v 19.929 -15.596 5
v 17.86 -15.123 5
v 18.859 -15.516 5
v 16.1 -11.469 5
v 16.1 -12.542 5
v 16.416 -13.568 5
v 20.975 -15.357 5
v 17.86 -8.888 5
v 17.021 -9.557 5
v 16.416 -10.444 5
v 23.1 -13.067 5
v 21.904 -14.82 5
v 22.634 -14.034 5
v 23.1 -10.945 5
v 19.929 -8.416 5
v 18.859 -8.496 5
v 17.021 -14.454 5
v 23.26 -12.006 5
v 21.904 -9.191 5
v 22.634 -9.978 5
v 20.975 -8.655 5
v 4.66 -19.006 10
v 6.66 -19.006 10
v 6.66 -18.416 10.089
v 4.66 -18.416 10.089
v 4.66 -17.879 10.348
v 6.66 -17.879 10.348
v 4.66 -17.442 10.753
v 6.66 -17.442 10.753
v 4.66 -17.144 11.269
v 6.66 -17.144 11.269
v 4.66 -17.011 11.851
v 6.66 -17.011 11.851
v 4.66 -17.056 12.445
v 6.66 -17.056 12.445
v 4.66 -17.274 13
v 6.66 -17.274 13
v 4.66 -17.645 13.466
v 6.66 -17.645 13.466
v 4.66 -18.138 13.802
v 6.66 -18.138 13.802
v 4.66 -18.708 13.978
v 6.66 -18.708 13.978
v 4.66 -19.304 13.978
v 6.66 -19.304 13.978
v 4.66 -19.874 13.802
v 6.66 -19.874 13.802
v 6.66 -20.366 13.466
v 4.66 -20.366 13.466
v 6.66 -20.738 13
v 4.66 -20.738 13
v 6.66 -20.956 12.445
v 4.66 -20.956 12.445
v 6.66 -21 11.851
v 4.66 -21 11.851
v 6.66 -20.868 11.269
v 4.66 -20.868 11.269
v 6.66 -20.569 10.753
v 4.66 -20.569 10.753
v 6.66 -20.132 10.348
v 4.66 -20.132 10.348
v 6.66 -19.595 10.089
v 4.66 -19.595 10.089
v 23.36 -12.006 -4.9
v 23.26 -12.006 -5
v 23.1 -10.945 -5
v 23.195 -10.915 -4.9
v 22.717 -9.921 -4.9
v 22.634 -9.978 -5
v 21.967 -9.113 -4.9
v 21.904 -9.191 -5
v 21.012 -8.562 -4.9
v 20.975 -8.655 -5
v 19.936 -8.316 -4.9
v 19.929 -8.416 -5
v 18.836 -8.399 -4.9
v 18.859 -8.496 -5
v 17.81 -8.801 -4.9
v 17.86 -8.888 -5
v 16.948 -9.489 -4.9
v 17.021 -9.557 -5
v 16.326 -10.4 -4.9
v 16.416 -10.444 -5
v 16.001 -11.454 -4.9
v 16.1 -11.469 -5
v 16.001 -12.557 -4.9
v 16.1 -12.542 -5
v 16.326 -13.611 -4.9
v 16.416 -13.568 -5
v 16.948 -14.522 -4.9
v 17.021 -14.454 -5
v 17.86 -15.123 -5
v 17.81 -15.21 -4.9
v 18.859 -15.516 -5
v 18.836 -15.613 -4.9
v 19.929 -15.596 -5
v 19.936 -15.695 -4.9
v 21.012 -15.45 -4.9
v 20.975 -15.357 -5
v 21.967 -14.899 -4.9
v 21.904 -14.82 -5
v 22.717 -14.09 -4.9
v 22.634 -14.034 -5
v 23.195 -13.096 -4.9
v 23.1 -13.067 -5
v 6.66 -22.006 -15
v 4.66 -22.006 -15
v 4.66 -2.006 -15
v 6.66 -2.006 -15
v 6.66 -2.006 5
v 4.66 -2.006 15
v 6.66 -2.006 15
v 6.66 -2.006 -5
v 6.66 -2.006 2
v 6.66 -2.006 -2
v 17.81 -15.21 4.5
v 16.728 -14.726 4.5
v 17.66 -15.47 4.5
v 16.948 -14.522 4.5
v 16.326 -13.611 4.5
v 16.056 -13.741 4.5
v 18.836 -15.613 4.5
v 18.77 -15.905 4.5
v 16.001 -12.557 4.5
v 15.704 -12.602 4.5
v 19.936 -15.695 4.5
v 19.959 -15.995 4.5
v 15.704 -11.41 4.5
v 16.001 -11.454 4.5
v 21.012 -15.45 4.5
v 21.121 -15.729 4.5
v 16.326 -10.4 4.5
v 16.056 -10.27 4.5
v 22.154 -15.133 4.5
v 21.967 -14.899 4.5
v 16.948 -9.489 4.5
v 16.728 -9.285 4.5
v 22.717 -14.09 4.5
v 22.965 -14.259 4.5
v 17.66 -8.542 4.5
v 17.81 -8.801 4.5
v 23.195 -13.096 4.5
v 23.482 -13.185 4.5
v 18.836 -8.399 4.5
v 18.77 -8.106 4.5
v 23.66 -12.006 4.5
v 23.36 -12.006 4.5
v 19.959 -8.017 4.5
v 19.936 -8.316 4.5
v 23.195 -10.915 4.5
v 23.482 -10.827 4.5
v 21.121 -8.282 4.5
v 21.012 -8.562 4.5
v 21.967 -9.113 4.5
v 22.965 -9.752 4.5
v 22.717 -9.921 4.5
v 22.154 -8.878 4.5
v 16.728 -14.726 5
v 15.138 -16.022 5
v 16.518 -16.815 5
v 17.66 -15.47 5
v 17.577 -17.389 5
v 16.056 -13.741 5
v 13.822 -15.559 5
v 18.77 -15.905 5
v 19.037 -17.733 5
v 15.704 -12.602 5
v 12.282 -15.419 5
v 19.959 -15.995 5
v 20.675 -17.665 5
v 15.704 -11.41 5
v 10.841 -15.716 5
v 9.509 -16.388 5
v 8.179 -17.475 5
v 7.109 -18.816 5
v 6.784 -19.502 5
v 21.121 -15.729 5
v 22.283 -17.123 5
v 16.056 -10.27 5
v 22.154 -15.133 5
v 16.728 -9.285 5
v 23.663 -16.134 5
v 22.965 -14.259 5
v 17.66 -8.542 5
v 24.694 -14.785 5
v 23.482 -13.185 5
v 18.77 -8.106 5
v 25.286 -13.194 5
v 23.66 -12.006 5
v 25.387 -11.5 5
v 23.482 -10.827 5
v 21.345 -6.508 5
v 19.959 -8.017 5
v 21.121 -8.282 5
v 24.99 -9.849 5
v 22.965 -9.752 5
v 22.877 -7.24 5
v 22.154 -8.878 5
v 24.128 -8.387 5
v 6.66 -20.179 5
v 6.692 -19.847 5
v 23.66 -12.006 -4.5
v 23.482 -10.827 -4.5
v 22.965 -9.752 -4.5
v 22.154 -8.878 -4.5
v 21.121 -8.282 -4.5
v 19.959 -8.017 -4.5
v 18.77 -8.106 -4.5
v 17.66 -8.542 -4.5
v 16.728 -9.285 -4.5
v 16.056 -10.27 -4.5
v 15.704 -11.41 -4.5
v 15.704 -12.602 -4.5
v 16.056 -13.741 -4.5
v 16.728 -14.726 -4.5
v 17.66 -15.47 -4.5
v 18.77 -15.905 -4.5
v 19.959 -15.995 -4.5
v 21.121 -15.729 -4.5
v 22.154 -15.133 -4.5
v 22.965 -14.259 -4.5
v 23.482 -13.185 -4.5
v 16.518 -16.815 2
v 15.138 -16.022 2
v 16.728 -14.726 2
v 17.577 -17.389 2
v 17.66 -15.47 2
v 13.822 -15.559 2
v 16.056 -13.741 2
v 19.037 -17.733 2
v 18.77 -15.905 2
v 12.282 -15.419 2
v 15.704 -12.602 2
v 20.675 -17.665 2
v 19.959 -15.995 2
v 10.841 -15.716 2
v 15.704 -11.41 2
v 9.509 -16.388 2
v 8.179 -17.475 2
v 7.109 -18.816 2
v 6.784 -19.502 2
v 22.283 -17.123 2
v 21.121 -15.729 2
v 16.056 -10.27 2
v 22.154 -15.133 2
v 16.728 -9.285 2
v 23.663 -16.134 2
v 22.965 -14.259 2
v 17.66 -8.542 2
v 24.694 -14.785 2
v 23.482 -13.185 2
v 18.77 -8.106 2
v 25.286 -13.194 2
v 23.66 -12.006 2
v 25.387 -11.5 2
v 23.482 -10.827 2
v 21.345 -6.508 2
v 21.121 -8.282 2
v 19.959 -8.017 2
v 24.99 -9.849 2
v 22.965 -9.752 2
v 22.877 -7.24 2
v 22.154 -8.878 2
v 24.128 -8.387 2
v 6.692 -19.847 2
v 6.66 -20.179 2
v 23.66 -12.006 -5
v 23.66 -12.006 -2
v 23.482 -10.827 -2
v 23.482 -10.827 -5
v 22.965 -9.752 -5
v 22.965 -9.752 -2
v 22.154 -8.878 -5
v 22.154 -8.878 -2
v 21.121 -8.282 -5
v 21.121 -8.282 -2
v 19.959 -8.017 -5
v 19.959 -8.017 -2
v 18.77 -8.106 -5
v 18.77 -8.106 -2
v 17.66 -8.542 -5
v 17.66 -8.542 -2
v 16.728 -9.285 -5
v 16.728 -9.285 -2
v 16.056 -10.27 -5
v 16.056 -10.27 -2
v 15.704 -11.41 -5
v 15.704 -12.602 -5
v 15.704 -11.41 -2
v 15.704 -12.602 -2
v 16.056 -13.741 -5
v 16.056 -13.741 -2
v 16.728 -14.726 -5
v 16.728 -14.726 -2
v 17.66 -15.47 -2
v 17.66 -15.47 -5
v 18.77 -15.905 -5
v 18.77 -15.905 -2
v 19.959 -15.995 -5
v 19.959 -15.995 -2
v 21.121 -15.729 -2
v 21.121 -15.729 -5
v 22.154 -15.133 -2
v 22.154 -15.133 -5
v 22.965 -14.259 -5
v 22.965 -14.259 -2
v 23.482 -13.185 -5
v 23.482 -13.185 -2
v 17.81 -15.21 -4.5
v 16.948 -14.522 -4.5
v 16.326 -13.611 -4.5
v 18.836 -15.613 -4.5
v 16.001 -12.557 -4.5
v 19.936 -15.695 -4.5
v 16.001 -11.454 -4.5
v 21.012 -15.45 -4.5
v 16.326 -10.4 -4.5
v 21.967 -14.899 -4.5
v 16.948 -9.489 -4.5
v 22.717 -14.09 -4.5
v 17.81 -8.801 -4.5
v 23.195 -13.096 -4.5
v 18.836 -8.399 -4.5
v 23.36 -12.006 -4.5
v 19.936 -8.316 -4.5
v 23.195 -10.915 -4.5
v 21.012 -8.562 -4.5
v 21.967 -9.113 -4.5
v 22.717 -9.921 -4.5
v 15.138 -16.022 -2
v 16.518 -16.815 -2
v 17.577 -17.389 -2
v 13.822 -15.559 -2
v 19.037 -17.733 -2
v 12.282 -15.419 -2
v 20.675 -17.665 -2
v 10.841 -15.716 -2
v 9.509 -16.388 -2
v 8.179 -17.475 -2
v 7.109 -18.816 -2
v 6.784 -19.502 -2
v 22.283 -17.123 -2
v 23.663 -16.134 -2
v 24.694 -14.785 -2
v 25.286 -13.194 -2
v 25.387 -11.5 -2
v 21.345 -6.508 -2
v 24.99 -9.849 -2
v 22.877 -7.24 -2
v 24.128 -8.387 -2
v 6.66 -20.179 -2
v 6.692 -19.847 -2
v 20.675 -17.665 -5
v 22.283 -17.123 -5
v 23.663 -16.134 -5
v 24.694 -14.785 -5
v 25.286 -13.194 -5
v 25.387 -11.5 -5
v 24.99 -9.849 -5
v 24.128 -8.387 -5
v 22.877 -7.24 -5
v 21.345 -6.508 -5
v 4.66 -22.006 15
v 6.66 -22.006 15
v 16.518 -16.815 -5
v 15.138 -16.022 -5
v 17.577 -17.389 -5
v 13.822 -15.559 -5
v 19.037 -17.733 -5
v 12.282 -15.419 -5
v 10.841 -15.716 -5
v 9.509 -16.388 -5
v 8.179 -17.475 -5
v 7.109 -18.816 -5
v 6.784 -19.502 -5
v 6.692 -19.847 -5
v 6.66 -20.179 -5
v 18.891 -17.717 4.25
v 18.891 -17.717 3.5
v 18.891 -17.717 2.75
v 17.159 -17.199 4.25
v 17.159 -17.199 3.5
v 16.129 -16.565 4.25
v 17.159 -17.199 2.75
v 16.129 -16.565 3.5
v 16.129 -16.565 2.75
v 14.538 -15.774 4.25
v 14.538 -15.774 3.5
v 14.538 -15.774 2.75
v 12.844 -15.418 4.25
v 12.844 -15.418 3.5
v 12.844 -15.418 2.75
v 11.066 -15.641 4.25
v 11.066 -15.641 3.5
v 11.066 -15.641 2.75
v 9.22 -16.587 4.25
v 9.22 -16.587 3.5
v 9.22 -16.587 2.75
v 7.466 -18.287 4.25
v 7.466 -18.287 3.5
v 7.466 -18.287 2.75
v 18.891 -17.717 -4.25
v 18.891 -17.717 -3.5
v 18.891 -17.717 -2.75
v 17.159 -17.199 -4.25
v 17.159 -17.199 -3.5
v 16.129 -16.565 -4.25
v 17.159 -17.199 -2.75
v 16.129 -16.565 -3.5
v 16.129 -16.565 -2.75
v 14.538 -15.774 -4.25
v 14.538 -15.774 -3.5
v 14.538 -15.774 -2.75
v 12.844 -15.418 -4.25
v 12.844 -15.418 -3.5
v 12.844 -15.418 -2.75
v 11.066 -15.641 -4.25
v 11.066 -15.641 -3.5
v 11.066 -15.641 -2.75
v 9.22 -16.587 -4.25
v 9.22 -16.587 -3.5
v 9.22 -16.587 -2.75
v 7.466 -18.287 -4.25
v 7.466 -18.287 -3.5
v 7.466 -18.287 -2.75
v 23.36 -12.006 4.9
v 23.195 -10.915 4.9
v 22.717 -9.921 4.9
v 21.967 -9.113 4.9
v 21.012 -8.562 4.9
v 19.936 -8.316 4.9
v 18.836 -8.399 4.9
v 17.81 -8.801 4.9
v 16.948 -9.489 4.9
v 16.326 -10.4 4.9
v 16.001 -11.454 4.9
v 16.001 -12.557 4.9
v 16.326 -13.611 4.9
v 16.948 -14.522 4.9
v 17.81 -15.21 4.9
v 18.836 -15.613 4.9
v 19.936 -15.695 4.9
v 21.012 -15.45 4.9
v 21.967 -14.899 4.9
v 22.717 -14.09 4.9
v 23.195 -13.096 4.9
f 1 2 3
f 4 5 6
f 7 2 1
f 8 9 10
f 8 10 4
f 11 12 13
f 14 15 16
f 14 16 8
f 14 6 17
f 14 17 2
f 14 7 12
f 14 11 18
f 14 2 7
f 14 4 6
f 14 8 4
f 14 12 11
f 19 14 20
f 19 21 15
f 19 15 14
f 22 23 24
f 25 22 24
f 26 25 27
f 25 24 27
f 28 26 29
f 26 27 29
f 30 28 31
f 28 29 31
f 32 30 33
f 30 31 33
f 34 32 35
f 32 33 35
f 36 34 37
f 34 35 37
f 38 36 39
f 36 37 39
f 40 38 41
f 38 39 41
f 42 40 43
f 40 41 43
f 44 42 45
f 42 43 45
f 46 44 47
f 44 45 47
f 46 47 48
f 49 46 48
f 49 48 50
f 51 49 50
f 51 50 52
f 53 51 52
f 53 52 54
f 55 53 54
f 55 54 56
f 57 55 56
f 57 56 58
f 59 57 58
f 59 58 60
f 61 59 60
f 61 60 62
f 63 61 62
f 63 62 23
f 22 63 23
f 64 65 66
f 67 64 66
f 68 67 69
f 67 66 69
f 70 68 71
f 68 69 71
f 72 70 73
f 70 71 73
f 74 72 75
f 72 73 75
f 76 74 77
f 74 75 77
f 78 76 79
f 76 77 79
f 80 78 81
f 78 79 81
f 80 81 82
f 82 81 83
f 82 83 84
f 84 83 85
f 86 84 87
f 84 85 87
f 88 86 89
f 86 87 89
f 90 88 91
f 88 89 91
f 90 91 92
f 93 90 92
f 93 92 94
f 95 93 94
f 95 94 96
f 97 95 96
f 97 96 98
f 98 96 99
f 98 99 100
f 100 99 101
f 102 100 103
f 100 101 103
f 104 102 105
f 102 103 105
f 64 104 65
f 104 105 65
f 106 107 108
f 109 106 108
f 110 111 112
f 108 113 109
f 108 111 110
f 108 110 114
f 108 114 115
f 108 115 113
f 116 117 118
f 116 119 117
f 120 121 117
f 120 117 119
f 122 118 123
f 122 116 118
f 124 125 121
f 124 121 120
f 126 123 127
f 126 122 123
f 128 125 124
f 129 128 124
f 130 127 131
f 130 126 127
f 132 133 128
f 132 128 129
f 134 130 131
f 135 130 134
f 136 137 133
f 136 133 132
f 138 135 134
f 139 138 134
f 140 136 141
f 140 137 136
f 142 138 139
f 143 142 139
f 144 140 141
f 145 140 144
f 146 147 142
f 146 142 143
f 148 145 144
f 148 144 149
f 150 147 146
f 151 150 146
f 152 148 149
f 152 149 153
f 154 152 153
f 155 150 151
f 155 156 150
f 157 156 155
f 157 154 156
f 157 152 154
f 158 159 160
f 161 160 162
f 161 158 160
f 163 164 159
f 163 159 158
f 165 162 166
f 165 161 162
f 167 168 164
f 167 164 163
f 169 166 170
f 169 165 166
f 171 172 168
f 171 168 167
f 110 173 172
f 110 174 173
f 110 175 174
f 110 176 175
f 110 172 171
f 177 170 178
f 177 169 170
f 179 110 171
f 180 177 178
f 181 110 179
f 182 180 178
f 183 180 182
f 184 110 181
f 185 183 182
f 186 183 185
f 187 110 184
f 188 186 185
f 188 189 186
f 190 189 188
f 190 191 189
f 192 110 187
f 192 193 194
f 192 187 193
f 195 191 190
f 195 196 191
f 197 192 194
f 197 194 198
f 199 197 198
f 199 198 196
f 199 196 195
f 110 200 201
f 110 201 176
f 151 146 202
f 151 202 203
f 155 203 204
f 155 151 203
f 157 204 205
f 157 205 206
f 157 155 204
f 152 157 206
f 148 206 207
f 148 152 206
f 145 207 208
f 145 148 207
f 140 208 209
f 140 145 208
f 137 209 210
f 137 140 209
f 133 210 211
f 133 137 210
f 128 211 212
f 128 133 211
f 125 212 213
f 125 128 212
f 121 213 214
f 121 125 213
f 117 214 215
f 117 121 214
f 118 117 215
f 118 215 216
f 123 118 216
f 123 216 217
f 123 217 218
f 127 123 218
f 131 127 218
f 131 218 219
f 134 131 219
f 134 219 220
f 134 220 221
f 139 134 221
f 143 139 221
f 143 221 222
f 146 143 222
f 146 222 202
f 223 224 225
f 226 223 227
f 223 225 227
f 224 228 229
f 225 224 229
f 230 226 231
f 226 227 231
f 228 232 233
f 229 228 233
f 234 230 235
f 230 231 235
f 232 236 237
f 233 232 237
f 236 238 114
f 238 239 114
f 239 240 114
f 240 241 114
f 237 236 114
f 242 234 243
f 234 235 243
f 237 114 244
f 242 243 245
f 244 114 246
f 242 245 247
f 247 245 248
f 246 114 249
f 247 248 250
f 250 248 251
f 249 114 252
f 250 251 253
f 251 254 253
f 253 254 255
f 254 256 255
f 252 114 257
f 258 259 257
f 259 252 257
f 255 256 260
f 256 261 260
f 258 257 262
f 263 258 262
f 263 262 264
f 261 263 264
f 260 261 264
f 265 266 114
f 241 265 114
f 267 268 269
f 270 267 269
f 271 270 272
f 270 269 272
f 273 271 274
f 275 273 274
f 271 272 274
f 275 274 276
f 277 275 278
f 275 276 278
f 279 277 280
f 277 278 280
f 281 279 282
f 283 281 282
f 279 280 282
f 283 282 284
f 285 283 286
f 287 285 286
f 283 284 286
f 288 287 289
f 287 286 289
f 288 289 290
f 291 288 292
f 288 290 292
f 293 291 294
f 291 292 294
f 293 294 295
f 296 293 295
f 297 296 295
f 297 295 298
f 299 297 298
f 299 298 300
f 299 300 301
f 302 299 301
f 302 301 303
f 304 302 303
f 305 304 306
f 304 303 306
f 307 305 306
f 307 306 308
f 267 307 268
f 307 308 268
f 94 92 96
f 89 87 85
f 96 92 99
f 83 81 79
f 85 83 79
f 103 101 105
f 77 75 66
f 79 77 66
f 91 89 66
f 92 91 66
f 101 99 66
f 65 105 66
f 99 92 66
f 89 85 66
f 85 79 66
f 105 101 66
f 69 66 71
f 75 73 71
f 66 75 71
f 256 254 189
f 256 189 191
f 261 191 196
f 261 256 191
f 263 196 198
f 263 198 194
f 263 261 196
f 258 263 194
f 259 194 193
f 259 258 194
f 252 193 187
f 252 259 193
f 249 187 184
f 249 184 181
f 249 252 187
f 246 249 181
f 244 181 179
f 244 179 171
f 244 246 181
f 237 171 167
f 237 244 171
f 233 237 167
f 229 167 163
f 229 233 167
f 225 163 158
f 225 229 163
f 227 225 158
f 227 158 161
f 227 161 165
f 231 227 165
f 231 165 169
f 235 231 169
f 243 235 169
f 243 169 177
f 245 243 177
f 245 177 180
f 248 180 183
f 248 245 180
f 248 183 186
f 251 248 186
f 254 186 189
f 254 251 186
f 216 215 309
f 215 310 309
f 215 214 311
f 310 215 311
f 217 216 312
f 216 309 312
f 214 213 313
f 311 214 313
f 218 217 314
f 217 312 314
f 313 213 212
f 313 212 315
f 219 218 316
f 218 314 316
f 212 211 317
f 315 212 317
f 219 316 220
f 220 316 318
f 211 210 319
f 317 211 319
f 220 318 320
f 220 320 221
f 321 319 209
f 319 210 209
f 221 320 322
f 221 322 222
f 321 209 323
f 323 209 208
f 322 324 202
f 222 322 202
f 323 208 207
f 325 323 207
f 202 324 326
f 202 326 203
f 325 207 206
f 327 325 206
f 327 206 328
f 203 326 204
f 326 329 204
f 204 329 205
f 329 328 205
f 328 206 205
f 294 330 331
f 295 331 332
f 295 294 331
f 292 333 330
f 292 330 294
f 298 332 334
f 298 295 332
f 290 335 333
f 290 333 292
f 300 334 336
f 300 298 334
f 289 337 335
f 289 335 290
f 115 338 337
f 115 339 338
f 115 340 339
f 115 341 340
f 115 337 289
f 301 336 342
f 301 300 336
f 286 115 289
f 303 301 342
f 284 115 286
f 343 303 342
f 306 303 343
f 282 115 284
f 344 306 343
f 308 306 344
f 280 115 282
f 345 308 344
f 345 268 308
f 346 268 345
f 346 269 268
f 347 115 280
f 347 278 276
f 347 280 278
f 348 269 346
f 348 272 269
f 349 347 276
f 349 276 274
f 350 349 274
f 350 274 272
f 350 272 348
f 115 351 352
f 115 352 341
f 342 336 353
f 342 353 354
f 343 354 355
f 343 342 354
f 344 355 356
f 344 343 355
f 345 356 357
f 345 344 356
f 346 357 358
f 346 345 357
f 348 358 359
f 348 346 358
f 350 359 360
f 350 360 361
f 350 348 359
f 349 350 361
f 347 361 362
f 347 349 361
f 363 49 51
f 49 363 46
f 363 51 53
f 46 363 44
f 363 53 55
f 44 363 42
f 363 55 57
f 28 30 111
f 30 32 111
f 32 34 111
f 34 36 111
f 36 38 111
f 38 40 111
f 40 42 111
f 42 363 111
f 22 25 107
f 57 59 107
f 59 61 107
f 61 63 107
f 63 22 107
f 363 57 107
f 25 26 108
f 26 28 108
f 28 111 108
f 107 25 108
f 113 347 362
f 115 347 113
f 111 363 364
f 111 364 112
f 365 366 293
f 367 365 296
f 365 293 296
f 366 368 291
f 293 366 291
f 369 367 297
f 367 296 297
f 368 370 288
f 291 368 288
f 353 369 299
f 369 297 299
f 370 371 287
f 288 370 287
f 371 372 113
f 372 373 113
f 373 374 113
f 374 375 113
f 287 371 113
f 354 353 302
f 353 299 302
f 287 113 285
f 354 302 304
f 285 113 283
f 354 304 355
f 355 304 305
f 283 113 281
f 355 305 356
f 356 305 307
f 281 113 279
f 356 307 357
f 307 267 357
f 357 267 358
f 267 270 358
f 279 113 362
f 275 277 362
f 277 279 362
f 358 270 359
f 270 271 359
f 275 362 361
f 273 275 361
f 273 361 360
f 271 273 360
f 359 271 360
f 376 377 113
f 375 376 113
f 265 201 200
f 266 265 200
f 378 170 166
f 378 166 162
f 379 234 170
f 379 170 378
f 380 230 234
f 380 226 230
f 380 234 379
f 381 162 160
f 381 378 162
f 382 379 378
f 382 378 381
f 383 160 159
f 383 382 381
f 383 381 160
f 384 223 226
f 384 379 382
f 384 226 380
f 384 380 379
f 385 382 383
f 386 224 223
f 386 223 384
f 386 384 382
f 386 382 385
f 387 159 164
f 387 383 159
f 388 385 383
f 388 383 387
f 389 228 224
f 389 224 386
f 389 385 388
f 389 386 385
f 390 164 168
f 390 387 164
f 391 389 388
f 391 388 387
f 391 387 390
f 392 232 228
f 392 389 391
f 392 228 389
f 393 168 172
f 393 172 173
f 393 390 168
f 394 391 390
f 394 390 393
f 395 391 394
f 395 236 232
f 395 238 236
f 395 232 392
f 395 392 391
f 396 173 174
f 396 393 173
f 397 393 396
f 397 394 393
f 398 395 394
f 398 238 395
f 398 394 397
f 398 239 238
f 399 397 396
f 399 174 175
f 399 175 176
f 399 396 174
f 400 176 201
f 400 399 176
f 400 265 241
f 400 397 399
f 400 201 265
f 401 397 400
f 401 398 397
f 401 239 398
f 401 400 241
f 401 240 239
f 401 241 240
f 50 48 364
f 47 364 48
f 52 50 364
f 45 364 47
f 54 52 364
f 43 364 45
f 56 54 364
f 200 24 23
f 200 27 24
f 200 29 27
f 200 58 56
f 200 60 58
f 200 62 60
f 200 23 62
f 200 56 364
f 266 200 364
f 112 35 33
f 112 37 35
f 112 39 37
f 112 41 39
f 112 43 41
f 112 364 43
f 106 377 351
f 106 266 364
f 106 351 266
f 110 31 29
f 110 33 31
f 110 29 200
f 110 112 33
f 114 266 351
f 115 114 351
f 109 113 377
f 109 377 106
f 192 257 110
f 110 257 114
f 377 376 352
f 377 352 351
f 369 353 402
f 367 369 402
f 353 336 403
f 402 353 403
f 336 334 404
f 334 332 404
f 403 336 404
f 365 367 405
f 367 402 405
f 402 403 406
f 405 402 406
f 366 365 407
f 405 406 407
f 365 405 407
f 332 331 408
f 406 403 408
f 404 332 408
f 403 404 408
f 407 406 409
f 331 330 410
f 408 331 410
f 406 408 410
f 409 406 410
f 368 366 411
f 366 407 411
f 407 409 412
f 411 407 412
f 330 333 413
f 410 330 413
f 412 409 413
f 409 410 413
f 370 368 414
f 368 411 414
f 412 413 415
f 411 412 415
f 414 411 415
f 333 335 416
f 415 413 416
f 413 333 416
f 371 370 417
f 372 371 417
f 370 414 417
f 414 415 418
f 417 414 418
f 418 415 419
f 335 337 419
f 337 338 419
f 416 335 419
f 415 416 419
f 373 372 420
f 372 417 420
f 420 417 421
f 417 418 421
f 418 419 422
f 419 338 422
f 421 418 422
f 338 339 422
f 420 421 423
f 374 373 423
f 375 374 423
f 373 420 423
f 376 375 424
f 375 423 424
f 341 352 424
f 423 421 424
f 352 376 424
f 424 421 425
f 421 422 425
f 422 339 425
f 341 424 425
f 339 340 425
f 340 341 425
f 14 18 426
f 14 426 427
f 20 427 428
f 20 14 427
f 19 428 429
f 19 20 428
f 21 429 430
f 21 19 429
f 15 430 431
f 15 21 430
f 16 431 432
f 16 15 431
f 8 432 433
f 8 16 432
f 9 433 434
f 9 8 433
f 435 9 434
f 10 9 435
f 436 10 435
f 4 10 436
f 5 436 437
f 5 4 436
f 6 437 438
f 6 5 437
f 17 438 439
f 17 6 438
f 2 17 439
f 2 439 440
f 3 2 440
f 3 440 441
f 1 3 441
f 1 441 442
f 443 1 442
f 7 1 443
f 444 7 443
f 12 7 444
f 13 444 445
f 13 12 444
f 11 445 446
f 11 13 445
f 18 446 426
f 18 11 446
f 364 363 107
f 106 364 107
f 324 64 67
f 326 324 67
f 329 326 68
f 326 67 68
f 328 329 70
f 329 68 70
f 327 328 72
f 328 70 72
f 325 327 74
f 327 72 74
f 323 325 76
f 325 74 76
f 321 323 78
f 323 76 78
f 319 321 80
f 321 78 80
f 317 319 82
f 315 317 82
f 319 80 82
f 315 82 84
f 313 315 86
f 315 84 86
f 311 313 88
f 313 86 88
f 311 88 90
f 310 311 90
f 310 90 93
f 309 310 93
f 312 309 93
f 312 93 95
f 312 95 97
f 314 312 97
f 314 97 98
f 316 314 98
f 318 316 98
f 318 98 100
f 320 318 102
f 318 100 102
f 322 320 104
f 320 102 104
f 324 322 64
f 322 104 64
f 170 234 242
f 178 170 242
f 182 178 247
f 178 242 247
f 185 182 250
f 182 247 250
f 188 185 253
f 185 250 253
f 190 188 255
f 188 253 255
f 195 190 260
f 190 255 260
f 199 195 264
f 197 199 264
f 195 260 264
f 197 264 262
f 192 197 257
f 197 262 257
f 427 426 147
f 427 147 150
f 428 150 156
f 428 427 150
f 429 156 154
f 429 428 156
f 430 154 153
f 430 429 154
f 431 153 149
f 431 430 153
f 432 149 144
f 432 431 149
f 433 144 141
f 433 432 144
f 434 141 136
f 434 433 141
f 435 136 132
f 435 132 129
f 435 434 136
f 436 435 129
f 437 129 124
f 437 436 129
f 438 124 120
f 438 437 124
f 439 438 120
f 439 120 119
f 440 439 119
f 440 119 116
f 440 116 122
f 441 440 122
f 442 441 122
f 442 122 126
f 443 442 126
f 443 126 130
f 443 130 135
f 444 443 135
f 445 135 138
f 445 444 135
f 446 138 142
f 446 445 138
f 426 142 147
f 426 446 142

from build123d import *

# Parameters (mm, degrees)
CROQUIS2_W              = 30
CROQUIS2_H              = 20
SALIENTE_EXTRUIR1_DEPTH = 2
CROQUIS3_R              = 4
SALIENTE_EXTRUIR2_DEPTH = 3
CORTAR_EXTRUIR1_REACH   = 4
CROQUIS4_R              = 2
CROQUIS5_R              = 4
SALIENTE_EXTRUIR3_DEPTH = 10
CROQUIS6_R              = 4
CROQUIS6_R_2            = 3.7
CORTAR_EXTRUIR2_DEPTH   = 0.5
CHAFL_N1_SIZE           = 0.1
CHAFL_N2_SIZE           = 0.1


with BuildPart() as part:
    # Croquis2 → Saliente-Extruir1 (new body)
    with BuildSketch(Plane(origin=(4.659796597, 0, 0), x_dir=(0, 0, -1), z_dir=(1, 0, 0))):
        with Locations((0, -12.005778573)):
            Rectangle(CROQUIS2_W, CROQUIS2_H)
    extrude(amount=SALIENTE_EXTRUIR1_DEPTH)

    # Croquis3 → Saliente-Extruir2 (add)
    with BuildSketch(Plane.XY.offset(2)):
        with BuildLine():
            Line((6.659796597, -2.005778573), (6.659796597, -20.178909471))
            add(Edge.make_bspline(
                [(20.674797989, -17.665484588), (19.534879052, -17.869915578), (17.792697559, -17.715041339), (14.47778283, -15.367332549), (10.519354529, -14.525160484), (6.659796597, -19.008146523), (6.659796597, -20.178909471)],
                knots=[0, 0, 0, 0, 0.22934623, 0.306026125, 0.766798948, 1, 1, 1, 1], degree=3))
            ThreePointArc((20.674797989, -17.665484588), (25.39944116, -12.350713765), (21.345306956, -6.508365106))
            Line((21.345306956, -6.508365106), (6.659796597, -2.005778573))
        make_face()
        with Locations((19.659796597, -12.005778573)):
            Circle(CROQUIS3_R, mode=Mode.SUBTRACT)
    saliente_extruir2 = extrude(amount=SALIENTE_EXTRUIR2_DEPTH)

    # Simetría1: Saliente-Extruir2 across plane
    add(saliente_extruir2.mirror(Plane.XY))

    # Croquis4 → Cortar-Extruir1 (cut, up to next)
    with BuildSketch(Plane(origin=(6.659796597, 0, 0), x_dir=(0, 0, -1), z_dir=(1, 0, 0)), mode=Mode.PRIVATE) as cortar_extruir1_sk1:
        with Locations((-12, -19.005778573)):
            Circle(CROQUIS4_R)
    cortar_extruir1_tool1 = extrude(cortar_extruir1_sk1.sketch, amount=-CORTAR_EXTRUIR1_REACH, mode=Mode.PRIVATE) & part.part
    add(cortar_extruir1_tool1.solids().sort_by_distance((6.659797, -19.005779, 12))[0], mode=Mode.SUBTRACT)


with BuildPart() as body_2:
    # Croquis5 → Saliente-Extruir3 (new body)
    with BuildSketch(Plane.XY.offset(5)):
        with Locations((19.659796597, -12.005778573)):
            Circle(CROQUIS5_R)
    extrude(amount=-SALIENTE_EXTRUIR3_DEPTH)

    # Croquis6 → Cortar-Extruir2 (cut)
    with BuildSketch(Plane.XY.offset(5)):
        with Locations((19.659796597, -12.005778573)):
            Circle(CROQUIS6_R)
        with Locations((19.659796597, -12.005778573)):
            Circle(CROQUIS6_R_2, mode=Mode.SUBTRACT)
    cortar_extruir2 = extrude(amount=-CORTAR_EXTRUIR2_DEPTH, mode=Mode.SUBTRACT)

    # Chaflán1
    chafl_n1_edges = [body_2.edges().sort_by_distance(p)[0] for p in [
        (15.959796597, -12.005778573, 5),
    ]]
    chamfer(chafl_n1_edges, length=CHAFL_N1_SIZE)

    # Simetría3: Cortar-Extruir2 across plane
    add(cortar_extruir2.mirror(Plane.XY), mode=Mode.SUBTRACT)

    # Chaflán2
    chafl_n2_edges = [body_2.edges().sort_by_distance(p)[0] for p in [
        (15.959796597, -12.005778573, -5),
    ]]
    chamfer(chafl_n2_edges, length=CHAFL_N2_SIZE)


solid = Compound([part.part, body_2.part])
